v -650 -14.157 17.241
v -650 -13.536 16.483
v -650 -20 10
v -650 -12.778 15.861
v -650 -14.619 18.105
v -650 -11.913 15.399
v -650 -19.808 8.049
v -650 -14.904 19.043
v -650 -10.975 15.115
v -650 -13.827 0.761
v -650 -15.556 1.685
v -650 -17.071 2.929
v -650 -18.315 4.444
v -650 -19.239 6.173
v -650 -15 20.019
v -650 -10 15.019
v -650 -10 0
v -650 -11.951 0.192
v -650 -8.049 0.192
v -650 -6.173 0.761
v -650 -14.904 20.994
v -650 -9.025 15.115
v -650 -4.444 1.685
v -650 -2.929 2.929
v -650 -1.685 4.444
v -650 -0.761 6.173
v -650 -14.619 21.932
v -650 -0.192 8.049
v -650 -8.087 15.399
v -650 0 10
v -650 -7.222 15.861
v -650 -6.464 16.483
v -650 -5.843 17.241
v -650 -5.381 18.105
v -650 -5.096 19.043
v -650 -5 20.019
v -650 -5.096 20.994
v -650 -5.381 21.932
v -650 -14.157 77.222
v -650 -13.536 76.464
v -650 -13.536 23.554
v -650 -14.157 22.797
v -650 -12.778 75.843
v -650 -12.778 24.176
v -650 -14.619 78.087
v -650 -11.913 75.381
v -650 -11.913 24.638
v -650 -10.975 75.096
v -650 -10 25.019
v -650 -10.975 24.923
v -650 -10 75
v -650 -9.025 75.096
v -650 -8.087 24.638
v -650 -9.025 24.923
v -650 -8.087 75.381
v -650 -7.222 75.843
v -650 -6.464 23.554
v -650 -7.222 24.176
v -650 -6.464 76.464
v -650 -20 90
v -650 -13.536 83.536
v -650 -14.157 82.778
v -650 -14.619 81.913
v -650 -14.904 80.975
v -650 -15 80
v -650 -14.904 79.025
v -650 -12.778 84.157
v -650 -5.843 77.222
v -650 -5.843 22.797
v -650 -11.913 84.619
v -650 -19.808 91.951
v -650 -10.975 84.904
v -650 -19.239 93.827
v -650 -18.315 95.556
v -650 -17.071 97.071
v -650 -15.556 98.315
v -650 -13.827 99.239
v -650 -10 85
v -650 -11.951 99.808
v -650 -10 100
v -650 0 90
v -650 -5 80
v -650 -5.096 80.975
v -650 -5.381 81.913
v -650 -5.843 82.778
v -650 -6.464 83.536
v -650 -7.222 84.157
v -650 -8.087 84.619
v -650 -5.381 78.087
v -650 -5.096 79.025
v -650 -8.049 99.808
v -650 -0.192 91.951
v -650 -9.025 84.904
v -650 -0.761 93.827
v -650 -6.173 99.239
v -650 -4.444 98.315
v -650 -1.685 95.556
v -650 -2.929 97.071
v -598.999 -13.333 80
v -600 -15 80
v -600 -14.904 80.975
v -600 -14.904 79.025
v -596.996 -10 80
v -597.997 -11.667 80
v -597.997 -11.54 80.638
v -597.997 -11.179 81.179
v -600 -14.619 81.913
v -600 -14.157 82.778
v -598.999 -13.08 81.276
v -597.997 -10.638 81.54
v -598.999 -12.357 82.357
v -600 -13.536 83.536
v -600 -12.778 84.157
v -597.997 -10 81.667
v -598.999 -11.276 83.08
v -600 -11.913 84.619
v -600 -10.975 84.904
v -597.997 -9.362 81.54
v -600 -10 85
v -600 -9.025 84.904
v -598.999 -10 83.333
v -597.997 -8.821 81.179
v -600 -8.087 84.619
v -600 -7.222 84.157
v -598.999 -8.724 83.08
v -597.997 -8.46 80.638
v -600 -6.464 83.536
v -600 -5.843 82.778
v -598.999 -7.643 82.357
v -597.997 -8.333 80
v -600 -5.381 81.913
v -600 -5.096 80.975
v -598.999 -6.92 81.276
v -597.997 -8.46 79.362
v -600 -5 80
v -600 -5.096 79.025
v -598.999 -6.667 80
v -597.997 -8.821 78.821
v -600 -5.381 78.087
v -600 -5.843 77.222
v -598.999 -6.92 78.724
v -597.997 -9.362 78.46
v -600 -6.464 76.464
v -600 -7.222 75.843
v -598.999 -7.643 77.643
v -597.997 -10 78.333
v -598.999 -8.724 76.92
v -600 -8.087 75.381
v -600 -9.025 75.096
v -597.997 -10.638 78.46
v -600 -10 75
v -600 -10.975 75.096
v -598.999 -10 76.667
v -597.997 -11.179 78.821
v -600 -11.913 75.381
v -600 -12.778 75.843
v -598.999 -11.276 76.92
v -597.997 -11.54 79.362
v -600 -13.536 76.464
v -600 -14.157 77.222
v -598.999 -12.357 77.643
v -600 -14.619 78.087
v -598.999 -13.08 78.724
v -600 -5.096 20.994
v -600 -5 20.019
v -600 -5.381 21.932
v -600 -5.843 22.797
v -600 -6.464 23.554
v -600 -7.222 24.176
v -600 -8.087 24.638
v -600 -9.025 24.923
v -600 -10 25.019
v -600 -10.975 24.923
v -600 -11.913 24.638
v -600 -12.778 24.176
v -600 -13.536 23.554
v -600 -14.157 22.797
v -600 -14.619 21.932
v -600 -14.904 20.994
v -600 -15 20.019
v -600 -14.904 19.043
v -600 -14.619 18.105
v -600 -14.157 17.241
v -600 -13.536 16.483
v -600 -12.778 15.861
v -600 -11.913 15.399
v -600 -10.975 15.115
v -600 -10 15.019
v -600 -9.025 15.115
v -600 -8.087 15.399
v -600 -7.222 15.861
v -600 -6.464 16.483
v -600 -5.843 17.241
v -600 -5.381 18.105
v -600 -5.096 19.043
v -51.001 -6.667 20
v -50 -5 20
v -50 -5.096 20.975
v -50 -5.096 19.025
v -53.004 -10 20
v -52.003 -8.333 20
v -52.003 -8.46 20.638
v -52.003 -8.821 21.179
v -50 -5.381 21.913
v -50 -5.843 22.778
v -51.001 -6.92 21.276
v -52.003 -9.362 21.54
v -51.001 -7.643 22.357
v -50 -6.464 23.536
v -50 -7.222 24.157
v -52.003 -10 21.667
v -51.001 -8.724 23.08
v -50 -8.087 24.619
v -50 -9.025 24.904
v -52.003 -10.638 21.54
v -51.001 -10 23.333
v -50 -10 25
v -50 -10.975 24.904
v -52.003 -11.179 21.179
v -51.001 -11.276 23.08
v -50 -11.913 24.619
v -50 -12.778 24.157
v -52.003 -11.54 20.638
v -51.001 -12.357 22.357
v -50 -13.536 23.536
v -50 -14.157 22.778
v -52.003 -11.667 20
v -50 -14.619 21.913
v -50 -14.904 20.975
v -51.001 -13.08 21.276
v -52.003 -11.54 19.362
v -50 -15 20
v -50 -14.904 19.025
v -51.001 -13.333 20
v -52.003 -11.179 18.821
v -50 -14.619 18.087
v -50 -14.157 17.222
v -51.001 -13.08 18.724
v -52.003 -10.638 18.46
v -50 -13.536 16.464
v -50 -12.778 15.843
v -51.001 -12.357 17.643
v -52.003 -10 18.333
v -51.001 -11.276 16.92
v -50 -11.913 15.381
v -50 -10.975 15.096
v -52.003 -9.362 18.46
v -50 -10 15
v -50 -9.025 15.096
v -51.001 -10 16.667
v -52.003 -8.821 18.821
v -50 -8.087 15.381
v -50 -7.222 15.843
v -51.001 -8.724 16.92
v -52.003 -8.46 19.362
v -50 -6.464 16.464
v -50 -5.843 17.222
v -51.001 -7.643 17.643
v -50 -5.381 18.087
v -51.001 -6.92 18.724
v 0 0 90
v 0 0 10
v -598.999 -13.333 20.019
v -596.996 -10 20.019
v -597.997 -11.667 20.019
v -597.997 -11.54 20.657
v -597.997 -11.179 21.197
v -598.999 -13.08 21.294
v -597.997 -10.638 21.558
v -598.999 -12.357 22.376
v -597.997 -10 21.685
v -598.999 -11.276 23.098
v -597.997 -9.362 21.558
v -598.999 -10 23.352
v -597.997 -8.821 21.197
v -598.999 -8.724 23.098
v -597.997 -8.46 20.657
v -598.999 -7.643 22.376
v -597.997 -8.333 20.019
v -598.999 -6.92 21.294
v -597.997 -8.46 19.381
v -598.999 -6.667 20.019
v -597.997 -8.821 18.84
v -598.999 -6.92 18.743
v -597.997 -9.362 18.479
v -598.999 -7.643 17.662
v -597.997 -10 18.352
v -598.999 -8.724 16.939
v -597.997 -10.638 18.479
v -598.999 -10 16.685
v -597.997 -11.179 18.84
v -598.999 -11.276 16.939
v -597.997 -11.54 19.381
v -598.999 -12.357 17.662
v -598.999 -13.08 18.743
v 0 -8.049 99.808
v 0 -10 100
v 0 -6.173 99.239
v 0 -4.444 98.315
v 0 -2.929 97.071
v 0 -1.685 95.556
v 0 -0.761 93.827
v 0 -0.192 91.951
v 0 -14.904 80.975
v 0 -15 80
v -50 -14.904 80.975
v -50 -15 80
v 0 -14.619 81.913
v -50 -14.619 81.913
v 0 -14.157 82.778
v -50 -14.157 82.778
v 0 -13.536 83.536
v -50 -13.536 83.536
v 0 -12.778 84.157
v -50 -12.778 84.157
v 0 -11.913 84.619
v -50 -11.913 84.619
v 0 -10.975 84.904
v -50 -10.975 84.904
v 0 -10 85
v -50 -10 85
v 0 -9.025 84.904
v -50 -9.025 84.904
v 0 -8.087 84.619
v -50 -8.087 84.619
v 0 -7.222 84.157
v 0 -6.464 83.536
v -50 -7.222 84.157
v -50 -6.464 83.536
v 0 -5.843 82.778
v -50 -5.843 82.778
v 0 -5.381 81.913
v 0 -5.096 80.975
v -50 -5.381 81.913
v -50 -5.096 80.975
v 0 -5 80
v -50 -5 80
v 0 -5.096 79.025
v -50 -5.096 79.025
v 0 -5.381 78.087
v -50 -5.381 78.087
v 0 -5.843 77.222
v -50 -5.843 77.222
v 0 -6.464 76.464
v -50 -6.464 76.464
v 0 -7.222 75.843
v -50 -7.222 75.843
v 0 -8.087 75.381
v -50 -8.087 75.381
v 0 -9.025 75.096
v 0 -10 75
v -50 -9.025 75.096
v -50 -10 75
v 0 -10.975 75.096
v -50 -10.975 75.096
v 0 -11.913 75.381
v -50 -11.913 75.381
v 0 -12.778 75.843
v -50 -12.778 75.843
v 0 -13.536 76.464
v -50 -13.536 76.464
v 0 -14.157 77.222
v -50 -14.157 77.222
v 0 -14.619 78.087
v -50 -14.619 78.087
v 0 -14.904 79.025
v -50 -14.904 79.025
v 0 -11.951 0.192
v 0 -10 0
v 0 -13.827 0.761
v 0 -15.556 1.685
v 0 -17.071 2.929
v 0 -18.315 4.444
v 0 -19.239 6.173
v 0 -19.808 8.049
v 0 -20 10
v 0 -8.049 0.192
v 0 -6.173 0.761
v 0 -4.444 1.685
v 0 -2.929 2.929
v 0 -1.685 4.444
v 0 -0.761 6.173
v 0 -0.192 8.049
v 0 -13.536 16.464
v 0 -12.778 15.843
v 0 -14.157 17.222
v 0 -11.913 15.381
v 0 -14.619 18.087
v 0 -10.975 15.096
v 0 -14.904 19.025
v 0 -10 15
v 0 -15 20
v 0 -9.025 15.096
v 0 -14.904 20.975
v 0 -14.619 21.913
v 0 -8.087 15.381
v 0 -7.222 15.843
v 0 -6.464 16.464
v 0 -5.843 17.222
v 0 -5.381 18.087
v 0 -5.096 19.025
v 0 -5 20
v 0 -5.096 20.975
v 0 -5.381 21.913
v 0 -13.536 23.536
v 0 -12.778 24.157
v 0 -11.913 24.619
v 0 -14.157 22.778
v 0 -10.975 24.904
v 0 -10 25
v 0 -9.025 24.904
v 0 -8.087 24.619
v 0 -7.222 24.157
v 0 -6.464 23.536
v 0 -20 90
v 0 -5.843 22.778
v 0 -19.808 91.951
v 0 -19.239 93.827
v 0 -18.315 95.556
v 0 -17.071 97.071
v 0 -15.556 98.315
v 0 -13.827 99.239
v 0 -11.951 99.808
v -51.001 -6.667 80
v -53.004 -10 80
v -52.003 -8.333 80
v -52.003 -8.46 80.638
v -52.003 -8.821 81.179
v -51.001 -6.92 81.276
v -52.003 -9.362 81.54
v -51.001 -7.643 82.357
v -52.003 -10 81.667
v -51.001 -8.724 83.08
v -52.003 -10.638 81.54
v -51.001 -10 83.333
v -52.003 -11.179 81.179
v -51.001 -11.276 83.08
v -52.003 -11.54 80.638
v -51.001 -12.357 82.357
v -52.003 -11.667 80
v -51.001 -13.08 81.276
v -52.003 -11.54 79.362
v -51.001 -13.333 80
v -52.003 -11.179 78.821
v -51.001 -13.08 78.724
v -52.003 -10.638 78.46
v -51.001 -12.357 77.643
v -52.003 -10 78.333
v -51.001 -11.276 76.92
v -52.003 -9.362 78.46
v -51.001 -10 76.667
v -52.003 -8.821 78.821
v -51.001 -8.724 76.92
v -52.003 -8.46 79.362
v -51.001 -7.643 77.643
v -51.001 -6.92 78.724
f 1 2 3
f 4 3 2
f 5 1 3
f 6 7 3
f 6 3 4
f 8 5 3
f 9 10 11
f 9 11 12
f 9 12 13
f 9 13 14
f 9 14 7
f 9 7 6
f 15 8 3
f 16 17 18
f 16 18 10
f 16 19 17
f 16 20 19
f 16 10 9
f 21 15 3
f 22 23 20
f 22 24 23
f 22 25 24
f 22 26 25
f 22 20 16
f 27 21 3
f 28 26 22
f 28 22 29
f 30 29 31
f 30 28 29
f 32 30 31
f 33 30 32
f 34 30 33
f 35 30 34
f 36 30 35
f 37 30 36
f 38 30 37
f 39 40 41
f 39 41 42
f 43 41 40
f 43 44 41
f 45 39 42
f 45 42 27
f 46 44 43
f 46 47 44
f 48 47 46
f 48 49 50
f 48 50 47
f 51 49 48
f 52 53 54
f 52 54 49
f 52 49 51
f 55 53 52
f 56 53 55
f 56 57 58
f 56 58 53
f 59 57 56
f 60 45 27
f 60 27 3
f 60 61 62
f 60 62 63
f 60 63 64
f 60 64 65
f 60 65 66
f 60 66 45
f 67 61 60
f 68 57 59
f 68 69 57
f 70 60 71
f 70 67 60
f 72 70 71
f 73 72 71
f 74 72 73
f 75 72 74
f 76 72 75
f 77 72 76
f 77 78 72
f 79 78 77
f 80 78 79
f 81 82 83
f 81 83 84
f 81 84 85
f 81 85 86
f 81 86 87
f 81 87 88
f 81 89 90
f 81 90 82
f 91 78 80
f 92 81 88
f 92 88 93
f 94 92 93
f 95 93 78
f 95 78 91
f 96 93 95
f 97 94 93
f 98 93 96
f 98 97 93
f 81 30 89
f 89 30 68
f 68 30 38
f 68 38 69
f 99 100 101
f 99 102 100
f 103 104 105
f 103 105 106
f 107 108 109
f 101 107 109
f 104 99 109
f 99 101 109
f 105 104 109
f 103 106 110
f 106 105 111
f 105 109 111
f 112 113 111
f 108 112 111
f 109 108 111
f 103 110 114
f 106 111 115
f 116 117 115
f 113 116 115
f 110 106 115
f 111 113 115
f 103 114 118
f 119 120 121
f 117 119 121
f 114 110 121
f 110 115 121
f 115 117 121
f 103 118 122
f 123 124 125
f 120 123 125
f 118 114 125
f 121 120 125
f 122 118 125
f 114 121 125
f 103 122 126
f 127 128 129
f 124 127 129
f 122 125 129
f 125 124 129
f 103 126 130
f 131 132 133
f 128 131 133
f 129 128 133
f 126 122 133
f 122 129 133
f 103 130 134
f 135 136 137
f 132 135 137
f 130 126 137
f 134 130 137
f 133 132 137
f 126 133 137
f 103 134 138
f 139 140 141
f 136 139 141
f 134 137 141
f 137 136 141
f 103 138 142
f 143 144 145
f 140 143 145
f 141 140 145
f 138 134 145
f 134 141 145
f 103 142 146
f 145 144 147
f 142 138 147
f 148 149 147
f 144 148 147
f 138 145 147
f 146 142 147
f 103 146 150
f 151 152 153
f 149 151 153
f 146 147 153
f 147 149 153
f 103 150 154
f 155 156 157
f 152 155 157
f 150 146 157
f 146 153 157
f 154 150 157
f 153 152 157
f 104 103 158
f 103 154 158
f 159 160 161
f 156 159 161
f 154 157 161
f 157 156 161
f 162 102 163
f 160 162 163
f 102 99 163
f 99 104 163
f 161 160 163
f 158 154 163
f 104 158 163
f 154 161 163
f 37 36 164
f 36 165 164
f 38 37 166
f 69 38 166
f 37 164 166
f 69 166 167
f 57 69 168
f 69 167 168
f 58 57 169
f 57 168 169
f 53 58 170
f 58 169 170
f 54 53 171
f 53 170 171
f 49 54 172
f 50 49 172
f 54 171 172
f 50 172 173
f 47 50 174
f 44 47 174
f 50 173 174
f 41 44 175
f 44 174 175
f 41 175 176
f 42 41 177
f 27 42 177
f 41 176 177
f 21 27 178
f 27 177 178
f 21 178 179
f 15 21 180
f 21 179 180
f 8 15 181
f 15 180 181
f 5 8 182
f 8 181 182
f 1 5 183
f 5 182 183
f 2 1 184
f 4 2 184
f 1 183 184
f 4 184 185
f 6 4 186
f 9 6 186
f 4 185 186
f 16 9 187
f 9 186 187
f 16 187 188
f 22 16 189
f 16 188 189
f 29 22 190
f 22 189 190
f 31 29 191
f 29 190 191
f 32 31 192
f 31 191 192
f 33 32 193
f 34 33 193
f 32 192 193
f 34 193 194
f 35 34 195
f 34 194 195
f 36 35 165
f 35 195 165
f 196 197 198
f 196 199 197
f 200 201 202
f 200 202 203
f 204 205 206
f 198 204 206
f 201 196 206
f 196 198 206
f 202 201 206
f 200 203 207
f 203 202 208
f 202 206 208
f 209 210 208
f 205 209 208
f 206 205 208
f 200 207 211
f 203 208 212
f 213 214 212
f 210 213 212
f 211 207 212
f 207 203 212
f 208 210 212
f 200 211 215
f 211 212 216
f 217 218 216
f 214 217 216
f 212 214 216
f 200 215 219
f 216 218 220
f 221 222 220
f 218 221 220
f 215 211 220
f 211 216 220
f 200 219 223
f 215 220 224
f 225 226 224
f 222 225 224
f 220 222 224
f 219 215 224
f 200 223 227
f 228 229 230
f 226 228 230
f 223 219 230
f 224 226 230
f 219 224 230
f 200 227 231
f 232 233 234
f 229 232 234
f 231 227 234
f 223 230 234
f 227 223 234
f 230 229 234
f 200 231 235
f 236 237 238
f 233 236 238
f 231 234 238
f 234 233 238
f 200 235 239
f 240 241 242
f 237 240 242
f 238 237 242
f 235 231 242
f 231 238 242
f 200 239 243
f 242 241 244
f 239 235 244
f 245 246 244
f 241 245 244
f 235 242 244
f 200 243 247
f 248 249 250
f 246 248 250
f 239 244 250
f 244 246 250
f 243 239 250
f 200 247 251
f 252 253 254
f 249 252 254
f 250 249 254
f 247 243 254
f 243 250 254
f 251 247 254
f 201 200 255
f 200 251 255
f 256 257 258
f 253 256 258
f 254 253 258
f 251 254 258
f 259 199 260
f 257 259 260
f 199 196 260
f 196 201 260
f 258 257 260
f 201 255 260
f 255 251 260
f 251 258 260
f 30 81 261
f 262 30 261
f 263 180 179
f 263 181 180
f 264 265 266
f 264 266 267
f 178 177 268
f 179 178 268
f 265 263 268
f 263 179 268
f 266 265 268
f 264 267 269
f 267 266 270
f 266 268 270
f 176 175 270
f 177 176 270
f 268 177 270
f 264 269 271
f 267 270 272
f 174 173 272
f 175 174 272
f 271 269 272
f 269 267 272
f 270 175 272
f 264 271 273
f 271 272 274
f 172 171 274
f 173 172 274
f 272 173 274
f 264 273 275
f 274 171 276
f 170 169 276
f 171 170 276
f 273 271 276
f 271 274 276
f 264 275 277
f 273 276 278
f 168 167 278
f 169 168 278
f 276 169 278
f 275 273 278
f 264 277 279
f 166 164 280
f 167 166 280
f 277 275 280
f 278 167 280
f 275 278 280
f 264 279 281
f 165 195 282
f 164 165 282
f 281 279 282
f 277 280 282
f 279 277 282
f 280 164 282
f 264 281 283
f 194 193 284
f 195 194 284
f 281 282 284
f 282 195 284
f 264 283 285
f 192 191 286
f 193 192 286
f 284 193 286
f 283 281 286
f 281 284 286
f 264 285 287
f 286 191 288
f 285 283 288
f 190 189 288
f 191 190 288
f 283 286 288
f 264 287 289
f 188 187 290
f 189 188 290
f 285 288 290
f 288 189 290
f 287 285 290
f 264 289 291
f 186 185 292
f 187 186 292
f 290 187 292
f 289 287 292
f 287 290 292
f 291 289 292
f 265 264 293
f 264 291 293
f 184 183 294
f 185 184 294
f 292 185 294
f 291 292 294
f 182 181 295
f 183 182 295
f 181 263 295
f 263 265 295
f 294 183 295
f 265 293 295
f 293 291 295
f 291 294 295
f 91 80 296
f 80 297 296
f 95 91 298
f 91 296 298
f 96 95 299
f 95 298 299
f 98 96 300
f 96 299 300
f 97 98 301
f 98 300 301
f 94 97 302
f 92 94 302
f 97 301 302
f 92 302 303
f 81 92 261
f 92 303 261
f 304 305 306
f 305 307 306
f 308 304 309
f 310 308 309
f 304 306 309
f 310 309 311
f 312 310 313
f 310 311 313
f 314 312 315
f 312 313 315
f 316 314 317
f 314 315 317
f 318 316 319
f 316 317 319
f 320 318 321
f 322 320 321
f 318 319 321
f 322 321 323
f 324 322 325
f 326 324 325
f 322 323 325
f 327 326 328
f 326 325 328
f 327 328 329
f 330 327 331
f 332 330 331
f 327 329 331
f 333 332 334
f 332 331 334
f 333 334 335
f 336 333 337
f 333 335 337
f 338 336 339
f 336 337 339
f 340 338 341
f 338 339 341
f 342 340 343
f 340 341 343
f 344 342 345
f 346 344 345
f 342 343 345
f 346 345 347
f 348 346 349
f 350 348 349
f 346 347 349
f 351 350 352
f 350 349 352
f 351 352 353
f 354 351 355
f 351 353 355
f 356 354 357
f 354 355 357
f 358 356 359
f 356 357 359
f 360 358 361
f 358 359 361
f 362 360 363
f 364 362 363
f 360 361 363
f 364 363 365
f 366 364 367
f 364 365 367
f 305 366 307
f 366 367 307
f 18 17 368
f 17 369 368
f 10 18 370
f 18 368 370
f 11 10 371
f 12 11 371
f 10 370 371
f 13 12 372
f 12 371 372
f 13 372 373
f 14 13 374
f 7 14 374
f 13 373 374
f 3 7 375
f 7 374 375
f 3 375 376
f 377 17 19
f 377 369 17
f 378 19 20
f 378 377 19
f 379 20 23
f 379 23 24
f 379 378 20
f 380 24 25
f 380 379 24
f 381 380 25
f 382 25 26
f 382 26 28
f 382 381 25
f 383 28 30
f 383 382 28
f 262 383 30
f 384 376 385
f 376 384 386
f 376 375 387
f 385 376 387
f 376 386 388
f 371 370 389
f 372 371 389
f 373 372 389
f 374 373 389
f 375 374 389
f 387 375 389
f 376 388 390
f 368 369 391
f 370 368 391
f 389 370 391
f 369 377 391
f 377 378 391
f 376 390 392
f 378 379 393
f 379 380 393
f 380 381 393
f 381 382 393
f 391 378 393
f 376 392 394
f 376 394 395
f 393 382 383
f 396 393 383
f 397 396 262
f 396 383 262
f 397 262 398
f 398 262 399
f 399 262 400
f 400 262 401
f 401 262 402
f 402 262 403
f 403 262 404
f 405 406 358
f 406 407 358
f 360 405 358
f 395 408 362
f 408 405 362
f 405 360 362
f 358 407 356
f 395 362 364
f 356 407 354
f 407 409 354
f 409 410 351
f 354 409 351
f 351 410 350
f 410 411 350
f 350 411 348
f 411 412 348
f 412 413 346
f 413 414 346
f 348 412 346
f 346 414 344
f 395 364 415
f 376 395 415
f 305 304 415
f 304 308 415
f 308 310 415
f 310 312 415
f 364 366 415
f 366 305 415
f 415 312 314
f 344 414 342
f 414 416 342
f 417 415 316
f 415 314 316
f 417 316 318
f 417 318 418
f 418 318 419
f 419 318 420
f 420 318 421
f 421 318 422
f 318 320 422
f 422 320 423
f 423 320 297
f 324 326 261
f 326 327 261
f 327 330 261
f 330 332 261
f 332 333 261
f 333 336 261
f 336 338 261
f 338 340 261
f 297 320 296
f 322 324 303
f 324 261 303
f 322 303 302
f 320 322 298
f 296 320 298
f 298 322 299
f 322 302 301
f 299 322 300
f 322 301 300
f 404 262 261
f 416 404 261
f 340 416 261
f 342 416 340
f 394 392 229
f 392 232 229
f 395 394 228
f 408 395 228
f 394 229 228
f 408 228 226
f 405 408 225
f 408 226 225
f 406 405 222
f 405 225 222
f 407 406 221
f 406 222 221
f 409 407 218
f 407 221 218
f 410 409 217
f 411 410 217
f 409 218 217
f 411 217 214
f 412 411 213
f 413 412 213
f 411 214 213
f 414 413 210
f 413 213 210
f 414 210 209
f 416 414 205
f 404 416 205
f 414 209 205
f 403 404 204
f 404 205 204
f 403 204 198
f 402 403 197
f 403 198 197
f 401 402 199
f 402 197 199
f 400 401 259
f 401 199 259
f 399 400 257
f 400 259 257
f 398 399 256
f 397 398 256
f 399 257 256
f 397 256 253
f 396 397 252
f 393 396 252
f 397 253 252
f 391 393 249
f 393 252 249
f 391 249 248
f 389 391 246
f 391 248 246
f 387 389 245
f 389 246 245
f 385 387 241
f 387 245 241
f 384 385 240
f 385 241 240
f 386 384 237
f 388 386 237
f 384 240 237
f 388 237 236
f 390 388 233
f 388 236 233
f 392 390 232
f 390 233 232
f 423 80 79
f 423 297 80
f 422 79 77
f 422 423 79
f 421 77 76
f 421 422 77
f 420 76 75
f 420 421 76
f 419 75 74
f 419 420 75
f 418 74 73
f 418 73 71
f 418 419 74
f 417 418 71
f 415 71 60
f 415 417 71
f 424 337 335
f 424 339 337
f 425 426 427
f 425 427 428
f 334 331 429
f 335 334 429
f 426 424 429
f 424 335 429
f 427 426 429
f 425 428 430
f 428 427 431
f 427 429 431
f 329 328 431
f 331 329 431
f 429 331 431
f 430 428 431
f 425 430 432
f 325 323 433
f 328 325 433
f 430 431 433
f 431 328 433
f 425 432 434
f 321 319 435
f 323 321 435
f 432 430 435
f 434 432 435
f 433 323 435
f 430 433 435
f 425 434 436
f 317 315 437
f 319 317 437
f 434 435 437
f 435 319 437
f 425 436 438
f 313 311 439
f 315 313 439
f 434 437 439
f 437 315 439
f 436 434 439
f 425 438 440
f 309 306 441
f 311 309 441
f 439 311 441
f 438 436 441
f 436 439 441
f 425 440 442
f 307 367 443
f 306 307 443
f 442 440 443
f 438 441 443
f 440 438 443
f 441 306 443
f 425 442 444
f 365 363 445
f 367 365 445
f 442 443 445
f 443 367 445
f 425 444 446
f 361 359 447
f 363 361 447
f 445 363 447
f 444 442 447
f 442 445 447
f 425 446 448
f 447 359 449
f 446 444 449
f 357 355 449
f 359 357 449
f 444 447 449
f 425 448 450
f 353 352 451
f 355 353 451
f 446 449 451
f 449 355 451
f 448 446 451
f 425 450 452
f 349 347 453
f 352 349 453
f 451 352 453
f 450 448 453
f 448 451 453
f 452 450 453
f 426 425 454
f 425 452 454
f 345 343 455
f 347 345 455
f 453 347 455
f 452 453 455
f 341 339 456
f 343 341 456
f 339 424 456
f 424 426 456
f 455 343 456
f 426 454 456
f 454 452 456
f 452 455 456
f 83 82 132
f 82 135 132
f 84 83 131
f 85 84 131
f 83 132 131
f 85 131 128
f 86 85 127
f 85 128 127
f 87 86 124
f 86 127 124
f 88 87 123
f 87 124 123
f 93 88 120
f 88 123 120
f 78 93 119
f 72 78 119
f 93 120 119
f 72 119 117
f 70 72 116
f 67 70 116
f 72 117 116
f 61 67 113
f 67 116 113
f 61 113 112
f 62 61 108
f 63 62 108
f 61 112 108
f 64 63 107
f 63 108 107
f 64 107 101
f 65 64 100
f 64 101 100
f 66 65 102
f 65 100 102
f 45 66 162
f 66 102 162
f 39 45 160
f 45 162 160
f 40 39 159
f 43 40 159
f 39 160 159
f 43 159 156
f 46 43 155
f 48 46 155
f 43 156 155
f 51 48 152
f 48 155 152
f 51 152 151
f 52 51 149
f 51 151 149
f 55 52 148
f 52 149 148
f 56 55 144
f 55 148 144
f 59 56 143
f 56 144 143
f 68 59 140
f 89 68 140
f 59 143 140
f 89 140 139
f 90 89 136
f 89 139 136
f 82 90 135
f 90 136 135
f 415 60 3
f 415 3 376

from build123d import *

# Parameters (mm, degrees)
F0_W     = 650
F0_H     = 100
F1_DEPTH = 20
F2_R     = 9.99999
F4_D     = 10
F4_DEPTH = 50
F4_TIP   = 3.0043030951
F6_D     = 10
F6_DEPTH = 50
F6_TIP   = 3.0043030951


# Not quite as in the source:
# - a fillet or chamfer is up to 0.001 mm smaller than in the source, because OpenCascade refuses the exact size


with BuildPart() as f1:
    # F0 (on Front) → F1 (new body)
    with BuildSketch(Plane.XZ):
        with Locations((-325, 50)):
            Rectangle(F0_W, F0_H)
    extrude(amount=F1_DEPTH)

    # F2 (radius 10 in the source; OpenCascade refuses exactly that, so slightly less here)
    f2_edges = [f1.edges().sort_by_distance(p)[0] for p in [
        (-325, 0, 100),
        (-325, -20, 100),
        (-325, 0, 0),
        (-325, -20, 0),
    ]]
    fillet(f2_edges, radius=F2_R)

    # F4
    with Locations(Plane(origin=(-650, 0, 0), x_dir=(0, -1, 0), z_dir=(-1, 0, 0))):
        with Locations((10, 20.0186959194), (10, 80)):
            Hole(F4_D / 2, depth=F4_DEPTH)
            with Locations((0, 0, -(F4_DEPTH + F4_TIP / 2))):  # 118° drill point
                Cone(0, F4_D / 2, F4_TIP, mode=Mode.SUBTRACT)

    # F6
    with Locations(Plane.YZ):
        with Locations((-10, 80), (-10, 20)):
            Hole(F6_D / 2, depth=F6_DEPTH)
            with Locations((0, 0, -(F6_DEPTH + F6_TIP / 2))):  # 118° drill point
                Cone(0, F6_D / 2, F6_TIP, mode=Mode.SUBTRACT)


solid = f1.part
